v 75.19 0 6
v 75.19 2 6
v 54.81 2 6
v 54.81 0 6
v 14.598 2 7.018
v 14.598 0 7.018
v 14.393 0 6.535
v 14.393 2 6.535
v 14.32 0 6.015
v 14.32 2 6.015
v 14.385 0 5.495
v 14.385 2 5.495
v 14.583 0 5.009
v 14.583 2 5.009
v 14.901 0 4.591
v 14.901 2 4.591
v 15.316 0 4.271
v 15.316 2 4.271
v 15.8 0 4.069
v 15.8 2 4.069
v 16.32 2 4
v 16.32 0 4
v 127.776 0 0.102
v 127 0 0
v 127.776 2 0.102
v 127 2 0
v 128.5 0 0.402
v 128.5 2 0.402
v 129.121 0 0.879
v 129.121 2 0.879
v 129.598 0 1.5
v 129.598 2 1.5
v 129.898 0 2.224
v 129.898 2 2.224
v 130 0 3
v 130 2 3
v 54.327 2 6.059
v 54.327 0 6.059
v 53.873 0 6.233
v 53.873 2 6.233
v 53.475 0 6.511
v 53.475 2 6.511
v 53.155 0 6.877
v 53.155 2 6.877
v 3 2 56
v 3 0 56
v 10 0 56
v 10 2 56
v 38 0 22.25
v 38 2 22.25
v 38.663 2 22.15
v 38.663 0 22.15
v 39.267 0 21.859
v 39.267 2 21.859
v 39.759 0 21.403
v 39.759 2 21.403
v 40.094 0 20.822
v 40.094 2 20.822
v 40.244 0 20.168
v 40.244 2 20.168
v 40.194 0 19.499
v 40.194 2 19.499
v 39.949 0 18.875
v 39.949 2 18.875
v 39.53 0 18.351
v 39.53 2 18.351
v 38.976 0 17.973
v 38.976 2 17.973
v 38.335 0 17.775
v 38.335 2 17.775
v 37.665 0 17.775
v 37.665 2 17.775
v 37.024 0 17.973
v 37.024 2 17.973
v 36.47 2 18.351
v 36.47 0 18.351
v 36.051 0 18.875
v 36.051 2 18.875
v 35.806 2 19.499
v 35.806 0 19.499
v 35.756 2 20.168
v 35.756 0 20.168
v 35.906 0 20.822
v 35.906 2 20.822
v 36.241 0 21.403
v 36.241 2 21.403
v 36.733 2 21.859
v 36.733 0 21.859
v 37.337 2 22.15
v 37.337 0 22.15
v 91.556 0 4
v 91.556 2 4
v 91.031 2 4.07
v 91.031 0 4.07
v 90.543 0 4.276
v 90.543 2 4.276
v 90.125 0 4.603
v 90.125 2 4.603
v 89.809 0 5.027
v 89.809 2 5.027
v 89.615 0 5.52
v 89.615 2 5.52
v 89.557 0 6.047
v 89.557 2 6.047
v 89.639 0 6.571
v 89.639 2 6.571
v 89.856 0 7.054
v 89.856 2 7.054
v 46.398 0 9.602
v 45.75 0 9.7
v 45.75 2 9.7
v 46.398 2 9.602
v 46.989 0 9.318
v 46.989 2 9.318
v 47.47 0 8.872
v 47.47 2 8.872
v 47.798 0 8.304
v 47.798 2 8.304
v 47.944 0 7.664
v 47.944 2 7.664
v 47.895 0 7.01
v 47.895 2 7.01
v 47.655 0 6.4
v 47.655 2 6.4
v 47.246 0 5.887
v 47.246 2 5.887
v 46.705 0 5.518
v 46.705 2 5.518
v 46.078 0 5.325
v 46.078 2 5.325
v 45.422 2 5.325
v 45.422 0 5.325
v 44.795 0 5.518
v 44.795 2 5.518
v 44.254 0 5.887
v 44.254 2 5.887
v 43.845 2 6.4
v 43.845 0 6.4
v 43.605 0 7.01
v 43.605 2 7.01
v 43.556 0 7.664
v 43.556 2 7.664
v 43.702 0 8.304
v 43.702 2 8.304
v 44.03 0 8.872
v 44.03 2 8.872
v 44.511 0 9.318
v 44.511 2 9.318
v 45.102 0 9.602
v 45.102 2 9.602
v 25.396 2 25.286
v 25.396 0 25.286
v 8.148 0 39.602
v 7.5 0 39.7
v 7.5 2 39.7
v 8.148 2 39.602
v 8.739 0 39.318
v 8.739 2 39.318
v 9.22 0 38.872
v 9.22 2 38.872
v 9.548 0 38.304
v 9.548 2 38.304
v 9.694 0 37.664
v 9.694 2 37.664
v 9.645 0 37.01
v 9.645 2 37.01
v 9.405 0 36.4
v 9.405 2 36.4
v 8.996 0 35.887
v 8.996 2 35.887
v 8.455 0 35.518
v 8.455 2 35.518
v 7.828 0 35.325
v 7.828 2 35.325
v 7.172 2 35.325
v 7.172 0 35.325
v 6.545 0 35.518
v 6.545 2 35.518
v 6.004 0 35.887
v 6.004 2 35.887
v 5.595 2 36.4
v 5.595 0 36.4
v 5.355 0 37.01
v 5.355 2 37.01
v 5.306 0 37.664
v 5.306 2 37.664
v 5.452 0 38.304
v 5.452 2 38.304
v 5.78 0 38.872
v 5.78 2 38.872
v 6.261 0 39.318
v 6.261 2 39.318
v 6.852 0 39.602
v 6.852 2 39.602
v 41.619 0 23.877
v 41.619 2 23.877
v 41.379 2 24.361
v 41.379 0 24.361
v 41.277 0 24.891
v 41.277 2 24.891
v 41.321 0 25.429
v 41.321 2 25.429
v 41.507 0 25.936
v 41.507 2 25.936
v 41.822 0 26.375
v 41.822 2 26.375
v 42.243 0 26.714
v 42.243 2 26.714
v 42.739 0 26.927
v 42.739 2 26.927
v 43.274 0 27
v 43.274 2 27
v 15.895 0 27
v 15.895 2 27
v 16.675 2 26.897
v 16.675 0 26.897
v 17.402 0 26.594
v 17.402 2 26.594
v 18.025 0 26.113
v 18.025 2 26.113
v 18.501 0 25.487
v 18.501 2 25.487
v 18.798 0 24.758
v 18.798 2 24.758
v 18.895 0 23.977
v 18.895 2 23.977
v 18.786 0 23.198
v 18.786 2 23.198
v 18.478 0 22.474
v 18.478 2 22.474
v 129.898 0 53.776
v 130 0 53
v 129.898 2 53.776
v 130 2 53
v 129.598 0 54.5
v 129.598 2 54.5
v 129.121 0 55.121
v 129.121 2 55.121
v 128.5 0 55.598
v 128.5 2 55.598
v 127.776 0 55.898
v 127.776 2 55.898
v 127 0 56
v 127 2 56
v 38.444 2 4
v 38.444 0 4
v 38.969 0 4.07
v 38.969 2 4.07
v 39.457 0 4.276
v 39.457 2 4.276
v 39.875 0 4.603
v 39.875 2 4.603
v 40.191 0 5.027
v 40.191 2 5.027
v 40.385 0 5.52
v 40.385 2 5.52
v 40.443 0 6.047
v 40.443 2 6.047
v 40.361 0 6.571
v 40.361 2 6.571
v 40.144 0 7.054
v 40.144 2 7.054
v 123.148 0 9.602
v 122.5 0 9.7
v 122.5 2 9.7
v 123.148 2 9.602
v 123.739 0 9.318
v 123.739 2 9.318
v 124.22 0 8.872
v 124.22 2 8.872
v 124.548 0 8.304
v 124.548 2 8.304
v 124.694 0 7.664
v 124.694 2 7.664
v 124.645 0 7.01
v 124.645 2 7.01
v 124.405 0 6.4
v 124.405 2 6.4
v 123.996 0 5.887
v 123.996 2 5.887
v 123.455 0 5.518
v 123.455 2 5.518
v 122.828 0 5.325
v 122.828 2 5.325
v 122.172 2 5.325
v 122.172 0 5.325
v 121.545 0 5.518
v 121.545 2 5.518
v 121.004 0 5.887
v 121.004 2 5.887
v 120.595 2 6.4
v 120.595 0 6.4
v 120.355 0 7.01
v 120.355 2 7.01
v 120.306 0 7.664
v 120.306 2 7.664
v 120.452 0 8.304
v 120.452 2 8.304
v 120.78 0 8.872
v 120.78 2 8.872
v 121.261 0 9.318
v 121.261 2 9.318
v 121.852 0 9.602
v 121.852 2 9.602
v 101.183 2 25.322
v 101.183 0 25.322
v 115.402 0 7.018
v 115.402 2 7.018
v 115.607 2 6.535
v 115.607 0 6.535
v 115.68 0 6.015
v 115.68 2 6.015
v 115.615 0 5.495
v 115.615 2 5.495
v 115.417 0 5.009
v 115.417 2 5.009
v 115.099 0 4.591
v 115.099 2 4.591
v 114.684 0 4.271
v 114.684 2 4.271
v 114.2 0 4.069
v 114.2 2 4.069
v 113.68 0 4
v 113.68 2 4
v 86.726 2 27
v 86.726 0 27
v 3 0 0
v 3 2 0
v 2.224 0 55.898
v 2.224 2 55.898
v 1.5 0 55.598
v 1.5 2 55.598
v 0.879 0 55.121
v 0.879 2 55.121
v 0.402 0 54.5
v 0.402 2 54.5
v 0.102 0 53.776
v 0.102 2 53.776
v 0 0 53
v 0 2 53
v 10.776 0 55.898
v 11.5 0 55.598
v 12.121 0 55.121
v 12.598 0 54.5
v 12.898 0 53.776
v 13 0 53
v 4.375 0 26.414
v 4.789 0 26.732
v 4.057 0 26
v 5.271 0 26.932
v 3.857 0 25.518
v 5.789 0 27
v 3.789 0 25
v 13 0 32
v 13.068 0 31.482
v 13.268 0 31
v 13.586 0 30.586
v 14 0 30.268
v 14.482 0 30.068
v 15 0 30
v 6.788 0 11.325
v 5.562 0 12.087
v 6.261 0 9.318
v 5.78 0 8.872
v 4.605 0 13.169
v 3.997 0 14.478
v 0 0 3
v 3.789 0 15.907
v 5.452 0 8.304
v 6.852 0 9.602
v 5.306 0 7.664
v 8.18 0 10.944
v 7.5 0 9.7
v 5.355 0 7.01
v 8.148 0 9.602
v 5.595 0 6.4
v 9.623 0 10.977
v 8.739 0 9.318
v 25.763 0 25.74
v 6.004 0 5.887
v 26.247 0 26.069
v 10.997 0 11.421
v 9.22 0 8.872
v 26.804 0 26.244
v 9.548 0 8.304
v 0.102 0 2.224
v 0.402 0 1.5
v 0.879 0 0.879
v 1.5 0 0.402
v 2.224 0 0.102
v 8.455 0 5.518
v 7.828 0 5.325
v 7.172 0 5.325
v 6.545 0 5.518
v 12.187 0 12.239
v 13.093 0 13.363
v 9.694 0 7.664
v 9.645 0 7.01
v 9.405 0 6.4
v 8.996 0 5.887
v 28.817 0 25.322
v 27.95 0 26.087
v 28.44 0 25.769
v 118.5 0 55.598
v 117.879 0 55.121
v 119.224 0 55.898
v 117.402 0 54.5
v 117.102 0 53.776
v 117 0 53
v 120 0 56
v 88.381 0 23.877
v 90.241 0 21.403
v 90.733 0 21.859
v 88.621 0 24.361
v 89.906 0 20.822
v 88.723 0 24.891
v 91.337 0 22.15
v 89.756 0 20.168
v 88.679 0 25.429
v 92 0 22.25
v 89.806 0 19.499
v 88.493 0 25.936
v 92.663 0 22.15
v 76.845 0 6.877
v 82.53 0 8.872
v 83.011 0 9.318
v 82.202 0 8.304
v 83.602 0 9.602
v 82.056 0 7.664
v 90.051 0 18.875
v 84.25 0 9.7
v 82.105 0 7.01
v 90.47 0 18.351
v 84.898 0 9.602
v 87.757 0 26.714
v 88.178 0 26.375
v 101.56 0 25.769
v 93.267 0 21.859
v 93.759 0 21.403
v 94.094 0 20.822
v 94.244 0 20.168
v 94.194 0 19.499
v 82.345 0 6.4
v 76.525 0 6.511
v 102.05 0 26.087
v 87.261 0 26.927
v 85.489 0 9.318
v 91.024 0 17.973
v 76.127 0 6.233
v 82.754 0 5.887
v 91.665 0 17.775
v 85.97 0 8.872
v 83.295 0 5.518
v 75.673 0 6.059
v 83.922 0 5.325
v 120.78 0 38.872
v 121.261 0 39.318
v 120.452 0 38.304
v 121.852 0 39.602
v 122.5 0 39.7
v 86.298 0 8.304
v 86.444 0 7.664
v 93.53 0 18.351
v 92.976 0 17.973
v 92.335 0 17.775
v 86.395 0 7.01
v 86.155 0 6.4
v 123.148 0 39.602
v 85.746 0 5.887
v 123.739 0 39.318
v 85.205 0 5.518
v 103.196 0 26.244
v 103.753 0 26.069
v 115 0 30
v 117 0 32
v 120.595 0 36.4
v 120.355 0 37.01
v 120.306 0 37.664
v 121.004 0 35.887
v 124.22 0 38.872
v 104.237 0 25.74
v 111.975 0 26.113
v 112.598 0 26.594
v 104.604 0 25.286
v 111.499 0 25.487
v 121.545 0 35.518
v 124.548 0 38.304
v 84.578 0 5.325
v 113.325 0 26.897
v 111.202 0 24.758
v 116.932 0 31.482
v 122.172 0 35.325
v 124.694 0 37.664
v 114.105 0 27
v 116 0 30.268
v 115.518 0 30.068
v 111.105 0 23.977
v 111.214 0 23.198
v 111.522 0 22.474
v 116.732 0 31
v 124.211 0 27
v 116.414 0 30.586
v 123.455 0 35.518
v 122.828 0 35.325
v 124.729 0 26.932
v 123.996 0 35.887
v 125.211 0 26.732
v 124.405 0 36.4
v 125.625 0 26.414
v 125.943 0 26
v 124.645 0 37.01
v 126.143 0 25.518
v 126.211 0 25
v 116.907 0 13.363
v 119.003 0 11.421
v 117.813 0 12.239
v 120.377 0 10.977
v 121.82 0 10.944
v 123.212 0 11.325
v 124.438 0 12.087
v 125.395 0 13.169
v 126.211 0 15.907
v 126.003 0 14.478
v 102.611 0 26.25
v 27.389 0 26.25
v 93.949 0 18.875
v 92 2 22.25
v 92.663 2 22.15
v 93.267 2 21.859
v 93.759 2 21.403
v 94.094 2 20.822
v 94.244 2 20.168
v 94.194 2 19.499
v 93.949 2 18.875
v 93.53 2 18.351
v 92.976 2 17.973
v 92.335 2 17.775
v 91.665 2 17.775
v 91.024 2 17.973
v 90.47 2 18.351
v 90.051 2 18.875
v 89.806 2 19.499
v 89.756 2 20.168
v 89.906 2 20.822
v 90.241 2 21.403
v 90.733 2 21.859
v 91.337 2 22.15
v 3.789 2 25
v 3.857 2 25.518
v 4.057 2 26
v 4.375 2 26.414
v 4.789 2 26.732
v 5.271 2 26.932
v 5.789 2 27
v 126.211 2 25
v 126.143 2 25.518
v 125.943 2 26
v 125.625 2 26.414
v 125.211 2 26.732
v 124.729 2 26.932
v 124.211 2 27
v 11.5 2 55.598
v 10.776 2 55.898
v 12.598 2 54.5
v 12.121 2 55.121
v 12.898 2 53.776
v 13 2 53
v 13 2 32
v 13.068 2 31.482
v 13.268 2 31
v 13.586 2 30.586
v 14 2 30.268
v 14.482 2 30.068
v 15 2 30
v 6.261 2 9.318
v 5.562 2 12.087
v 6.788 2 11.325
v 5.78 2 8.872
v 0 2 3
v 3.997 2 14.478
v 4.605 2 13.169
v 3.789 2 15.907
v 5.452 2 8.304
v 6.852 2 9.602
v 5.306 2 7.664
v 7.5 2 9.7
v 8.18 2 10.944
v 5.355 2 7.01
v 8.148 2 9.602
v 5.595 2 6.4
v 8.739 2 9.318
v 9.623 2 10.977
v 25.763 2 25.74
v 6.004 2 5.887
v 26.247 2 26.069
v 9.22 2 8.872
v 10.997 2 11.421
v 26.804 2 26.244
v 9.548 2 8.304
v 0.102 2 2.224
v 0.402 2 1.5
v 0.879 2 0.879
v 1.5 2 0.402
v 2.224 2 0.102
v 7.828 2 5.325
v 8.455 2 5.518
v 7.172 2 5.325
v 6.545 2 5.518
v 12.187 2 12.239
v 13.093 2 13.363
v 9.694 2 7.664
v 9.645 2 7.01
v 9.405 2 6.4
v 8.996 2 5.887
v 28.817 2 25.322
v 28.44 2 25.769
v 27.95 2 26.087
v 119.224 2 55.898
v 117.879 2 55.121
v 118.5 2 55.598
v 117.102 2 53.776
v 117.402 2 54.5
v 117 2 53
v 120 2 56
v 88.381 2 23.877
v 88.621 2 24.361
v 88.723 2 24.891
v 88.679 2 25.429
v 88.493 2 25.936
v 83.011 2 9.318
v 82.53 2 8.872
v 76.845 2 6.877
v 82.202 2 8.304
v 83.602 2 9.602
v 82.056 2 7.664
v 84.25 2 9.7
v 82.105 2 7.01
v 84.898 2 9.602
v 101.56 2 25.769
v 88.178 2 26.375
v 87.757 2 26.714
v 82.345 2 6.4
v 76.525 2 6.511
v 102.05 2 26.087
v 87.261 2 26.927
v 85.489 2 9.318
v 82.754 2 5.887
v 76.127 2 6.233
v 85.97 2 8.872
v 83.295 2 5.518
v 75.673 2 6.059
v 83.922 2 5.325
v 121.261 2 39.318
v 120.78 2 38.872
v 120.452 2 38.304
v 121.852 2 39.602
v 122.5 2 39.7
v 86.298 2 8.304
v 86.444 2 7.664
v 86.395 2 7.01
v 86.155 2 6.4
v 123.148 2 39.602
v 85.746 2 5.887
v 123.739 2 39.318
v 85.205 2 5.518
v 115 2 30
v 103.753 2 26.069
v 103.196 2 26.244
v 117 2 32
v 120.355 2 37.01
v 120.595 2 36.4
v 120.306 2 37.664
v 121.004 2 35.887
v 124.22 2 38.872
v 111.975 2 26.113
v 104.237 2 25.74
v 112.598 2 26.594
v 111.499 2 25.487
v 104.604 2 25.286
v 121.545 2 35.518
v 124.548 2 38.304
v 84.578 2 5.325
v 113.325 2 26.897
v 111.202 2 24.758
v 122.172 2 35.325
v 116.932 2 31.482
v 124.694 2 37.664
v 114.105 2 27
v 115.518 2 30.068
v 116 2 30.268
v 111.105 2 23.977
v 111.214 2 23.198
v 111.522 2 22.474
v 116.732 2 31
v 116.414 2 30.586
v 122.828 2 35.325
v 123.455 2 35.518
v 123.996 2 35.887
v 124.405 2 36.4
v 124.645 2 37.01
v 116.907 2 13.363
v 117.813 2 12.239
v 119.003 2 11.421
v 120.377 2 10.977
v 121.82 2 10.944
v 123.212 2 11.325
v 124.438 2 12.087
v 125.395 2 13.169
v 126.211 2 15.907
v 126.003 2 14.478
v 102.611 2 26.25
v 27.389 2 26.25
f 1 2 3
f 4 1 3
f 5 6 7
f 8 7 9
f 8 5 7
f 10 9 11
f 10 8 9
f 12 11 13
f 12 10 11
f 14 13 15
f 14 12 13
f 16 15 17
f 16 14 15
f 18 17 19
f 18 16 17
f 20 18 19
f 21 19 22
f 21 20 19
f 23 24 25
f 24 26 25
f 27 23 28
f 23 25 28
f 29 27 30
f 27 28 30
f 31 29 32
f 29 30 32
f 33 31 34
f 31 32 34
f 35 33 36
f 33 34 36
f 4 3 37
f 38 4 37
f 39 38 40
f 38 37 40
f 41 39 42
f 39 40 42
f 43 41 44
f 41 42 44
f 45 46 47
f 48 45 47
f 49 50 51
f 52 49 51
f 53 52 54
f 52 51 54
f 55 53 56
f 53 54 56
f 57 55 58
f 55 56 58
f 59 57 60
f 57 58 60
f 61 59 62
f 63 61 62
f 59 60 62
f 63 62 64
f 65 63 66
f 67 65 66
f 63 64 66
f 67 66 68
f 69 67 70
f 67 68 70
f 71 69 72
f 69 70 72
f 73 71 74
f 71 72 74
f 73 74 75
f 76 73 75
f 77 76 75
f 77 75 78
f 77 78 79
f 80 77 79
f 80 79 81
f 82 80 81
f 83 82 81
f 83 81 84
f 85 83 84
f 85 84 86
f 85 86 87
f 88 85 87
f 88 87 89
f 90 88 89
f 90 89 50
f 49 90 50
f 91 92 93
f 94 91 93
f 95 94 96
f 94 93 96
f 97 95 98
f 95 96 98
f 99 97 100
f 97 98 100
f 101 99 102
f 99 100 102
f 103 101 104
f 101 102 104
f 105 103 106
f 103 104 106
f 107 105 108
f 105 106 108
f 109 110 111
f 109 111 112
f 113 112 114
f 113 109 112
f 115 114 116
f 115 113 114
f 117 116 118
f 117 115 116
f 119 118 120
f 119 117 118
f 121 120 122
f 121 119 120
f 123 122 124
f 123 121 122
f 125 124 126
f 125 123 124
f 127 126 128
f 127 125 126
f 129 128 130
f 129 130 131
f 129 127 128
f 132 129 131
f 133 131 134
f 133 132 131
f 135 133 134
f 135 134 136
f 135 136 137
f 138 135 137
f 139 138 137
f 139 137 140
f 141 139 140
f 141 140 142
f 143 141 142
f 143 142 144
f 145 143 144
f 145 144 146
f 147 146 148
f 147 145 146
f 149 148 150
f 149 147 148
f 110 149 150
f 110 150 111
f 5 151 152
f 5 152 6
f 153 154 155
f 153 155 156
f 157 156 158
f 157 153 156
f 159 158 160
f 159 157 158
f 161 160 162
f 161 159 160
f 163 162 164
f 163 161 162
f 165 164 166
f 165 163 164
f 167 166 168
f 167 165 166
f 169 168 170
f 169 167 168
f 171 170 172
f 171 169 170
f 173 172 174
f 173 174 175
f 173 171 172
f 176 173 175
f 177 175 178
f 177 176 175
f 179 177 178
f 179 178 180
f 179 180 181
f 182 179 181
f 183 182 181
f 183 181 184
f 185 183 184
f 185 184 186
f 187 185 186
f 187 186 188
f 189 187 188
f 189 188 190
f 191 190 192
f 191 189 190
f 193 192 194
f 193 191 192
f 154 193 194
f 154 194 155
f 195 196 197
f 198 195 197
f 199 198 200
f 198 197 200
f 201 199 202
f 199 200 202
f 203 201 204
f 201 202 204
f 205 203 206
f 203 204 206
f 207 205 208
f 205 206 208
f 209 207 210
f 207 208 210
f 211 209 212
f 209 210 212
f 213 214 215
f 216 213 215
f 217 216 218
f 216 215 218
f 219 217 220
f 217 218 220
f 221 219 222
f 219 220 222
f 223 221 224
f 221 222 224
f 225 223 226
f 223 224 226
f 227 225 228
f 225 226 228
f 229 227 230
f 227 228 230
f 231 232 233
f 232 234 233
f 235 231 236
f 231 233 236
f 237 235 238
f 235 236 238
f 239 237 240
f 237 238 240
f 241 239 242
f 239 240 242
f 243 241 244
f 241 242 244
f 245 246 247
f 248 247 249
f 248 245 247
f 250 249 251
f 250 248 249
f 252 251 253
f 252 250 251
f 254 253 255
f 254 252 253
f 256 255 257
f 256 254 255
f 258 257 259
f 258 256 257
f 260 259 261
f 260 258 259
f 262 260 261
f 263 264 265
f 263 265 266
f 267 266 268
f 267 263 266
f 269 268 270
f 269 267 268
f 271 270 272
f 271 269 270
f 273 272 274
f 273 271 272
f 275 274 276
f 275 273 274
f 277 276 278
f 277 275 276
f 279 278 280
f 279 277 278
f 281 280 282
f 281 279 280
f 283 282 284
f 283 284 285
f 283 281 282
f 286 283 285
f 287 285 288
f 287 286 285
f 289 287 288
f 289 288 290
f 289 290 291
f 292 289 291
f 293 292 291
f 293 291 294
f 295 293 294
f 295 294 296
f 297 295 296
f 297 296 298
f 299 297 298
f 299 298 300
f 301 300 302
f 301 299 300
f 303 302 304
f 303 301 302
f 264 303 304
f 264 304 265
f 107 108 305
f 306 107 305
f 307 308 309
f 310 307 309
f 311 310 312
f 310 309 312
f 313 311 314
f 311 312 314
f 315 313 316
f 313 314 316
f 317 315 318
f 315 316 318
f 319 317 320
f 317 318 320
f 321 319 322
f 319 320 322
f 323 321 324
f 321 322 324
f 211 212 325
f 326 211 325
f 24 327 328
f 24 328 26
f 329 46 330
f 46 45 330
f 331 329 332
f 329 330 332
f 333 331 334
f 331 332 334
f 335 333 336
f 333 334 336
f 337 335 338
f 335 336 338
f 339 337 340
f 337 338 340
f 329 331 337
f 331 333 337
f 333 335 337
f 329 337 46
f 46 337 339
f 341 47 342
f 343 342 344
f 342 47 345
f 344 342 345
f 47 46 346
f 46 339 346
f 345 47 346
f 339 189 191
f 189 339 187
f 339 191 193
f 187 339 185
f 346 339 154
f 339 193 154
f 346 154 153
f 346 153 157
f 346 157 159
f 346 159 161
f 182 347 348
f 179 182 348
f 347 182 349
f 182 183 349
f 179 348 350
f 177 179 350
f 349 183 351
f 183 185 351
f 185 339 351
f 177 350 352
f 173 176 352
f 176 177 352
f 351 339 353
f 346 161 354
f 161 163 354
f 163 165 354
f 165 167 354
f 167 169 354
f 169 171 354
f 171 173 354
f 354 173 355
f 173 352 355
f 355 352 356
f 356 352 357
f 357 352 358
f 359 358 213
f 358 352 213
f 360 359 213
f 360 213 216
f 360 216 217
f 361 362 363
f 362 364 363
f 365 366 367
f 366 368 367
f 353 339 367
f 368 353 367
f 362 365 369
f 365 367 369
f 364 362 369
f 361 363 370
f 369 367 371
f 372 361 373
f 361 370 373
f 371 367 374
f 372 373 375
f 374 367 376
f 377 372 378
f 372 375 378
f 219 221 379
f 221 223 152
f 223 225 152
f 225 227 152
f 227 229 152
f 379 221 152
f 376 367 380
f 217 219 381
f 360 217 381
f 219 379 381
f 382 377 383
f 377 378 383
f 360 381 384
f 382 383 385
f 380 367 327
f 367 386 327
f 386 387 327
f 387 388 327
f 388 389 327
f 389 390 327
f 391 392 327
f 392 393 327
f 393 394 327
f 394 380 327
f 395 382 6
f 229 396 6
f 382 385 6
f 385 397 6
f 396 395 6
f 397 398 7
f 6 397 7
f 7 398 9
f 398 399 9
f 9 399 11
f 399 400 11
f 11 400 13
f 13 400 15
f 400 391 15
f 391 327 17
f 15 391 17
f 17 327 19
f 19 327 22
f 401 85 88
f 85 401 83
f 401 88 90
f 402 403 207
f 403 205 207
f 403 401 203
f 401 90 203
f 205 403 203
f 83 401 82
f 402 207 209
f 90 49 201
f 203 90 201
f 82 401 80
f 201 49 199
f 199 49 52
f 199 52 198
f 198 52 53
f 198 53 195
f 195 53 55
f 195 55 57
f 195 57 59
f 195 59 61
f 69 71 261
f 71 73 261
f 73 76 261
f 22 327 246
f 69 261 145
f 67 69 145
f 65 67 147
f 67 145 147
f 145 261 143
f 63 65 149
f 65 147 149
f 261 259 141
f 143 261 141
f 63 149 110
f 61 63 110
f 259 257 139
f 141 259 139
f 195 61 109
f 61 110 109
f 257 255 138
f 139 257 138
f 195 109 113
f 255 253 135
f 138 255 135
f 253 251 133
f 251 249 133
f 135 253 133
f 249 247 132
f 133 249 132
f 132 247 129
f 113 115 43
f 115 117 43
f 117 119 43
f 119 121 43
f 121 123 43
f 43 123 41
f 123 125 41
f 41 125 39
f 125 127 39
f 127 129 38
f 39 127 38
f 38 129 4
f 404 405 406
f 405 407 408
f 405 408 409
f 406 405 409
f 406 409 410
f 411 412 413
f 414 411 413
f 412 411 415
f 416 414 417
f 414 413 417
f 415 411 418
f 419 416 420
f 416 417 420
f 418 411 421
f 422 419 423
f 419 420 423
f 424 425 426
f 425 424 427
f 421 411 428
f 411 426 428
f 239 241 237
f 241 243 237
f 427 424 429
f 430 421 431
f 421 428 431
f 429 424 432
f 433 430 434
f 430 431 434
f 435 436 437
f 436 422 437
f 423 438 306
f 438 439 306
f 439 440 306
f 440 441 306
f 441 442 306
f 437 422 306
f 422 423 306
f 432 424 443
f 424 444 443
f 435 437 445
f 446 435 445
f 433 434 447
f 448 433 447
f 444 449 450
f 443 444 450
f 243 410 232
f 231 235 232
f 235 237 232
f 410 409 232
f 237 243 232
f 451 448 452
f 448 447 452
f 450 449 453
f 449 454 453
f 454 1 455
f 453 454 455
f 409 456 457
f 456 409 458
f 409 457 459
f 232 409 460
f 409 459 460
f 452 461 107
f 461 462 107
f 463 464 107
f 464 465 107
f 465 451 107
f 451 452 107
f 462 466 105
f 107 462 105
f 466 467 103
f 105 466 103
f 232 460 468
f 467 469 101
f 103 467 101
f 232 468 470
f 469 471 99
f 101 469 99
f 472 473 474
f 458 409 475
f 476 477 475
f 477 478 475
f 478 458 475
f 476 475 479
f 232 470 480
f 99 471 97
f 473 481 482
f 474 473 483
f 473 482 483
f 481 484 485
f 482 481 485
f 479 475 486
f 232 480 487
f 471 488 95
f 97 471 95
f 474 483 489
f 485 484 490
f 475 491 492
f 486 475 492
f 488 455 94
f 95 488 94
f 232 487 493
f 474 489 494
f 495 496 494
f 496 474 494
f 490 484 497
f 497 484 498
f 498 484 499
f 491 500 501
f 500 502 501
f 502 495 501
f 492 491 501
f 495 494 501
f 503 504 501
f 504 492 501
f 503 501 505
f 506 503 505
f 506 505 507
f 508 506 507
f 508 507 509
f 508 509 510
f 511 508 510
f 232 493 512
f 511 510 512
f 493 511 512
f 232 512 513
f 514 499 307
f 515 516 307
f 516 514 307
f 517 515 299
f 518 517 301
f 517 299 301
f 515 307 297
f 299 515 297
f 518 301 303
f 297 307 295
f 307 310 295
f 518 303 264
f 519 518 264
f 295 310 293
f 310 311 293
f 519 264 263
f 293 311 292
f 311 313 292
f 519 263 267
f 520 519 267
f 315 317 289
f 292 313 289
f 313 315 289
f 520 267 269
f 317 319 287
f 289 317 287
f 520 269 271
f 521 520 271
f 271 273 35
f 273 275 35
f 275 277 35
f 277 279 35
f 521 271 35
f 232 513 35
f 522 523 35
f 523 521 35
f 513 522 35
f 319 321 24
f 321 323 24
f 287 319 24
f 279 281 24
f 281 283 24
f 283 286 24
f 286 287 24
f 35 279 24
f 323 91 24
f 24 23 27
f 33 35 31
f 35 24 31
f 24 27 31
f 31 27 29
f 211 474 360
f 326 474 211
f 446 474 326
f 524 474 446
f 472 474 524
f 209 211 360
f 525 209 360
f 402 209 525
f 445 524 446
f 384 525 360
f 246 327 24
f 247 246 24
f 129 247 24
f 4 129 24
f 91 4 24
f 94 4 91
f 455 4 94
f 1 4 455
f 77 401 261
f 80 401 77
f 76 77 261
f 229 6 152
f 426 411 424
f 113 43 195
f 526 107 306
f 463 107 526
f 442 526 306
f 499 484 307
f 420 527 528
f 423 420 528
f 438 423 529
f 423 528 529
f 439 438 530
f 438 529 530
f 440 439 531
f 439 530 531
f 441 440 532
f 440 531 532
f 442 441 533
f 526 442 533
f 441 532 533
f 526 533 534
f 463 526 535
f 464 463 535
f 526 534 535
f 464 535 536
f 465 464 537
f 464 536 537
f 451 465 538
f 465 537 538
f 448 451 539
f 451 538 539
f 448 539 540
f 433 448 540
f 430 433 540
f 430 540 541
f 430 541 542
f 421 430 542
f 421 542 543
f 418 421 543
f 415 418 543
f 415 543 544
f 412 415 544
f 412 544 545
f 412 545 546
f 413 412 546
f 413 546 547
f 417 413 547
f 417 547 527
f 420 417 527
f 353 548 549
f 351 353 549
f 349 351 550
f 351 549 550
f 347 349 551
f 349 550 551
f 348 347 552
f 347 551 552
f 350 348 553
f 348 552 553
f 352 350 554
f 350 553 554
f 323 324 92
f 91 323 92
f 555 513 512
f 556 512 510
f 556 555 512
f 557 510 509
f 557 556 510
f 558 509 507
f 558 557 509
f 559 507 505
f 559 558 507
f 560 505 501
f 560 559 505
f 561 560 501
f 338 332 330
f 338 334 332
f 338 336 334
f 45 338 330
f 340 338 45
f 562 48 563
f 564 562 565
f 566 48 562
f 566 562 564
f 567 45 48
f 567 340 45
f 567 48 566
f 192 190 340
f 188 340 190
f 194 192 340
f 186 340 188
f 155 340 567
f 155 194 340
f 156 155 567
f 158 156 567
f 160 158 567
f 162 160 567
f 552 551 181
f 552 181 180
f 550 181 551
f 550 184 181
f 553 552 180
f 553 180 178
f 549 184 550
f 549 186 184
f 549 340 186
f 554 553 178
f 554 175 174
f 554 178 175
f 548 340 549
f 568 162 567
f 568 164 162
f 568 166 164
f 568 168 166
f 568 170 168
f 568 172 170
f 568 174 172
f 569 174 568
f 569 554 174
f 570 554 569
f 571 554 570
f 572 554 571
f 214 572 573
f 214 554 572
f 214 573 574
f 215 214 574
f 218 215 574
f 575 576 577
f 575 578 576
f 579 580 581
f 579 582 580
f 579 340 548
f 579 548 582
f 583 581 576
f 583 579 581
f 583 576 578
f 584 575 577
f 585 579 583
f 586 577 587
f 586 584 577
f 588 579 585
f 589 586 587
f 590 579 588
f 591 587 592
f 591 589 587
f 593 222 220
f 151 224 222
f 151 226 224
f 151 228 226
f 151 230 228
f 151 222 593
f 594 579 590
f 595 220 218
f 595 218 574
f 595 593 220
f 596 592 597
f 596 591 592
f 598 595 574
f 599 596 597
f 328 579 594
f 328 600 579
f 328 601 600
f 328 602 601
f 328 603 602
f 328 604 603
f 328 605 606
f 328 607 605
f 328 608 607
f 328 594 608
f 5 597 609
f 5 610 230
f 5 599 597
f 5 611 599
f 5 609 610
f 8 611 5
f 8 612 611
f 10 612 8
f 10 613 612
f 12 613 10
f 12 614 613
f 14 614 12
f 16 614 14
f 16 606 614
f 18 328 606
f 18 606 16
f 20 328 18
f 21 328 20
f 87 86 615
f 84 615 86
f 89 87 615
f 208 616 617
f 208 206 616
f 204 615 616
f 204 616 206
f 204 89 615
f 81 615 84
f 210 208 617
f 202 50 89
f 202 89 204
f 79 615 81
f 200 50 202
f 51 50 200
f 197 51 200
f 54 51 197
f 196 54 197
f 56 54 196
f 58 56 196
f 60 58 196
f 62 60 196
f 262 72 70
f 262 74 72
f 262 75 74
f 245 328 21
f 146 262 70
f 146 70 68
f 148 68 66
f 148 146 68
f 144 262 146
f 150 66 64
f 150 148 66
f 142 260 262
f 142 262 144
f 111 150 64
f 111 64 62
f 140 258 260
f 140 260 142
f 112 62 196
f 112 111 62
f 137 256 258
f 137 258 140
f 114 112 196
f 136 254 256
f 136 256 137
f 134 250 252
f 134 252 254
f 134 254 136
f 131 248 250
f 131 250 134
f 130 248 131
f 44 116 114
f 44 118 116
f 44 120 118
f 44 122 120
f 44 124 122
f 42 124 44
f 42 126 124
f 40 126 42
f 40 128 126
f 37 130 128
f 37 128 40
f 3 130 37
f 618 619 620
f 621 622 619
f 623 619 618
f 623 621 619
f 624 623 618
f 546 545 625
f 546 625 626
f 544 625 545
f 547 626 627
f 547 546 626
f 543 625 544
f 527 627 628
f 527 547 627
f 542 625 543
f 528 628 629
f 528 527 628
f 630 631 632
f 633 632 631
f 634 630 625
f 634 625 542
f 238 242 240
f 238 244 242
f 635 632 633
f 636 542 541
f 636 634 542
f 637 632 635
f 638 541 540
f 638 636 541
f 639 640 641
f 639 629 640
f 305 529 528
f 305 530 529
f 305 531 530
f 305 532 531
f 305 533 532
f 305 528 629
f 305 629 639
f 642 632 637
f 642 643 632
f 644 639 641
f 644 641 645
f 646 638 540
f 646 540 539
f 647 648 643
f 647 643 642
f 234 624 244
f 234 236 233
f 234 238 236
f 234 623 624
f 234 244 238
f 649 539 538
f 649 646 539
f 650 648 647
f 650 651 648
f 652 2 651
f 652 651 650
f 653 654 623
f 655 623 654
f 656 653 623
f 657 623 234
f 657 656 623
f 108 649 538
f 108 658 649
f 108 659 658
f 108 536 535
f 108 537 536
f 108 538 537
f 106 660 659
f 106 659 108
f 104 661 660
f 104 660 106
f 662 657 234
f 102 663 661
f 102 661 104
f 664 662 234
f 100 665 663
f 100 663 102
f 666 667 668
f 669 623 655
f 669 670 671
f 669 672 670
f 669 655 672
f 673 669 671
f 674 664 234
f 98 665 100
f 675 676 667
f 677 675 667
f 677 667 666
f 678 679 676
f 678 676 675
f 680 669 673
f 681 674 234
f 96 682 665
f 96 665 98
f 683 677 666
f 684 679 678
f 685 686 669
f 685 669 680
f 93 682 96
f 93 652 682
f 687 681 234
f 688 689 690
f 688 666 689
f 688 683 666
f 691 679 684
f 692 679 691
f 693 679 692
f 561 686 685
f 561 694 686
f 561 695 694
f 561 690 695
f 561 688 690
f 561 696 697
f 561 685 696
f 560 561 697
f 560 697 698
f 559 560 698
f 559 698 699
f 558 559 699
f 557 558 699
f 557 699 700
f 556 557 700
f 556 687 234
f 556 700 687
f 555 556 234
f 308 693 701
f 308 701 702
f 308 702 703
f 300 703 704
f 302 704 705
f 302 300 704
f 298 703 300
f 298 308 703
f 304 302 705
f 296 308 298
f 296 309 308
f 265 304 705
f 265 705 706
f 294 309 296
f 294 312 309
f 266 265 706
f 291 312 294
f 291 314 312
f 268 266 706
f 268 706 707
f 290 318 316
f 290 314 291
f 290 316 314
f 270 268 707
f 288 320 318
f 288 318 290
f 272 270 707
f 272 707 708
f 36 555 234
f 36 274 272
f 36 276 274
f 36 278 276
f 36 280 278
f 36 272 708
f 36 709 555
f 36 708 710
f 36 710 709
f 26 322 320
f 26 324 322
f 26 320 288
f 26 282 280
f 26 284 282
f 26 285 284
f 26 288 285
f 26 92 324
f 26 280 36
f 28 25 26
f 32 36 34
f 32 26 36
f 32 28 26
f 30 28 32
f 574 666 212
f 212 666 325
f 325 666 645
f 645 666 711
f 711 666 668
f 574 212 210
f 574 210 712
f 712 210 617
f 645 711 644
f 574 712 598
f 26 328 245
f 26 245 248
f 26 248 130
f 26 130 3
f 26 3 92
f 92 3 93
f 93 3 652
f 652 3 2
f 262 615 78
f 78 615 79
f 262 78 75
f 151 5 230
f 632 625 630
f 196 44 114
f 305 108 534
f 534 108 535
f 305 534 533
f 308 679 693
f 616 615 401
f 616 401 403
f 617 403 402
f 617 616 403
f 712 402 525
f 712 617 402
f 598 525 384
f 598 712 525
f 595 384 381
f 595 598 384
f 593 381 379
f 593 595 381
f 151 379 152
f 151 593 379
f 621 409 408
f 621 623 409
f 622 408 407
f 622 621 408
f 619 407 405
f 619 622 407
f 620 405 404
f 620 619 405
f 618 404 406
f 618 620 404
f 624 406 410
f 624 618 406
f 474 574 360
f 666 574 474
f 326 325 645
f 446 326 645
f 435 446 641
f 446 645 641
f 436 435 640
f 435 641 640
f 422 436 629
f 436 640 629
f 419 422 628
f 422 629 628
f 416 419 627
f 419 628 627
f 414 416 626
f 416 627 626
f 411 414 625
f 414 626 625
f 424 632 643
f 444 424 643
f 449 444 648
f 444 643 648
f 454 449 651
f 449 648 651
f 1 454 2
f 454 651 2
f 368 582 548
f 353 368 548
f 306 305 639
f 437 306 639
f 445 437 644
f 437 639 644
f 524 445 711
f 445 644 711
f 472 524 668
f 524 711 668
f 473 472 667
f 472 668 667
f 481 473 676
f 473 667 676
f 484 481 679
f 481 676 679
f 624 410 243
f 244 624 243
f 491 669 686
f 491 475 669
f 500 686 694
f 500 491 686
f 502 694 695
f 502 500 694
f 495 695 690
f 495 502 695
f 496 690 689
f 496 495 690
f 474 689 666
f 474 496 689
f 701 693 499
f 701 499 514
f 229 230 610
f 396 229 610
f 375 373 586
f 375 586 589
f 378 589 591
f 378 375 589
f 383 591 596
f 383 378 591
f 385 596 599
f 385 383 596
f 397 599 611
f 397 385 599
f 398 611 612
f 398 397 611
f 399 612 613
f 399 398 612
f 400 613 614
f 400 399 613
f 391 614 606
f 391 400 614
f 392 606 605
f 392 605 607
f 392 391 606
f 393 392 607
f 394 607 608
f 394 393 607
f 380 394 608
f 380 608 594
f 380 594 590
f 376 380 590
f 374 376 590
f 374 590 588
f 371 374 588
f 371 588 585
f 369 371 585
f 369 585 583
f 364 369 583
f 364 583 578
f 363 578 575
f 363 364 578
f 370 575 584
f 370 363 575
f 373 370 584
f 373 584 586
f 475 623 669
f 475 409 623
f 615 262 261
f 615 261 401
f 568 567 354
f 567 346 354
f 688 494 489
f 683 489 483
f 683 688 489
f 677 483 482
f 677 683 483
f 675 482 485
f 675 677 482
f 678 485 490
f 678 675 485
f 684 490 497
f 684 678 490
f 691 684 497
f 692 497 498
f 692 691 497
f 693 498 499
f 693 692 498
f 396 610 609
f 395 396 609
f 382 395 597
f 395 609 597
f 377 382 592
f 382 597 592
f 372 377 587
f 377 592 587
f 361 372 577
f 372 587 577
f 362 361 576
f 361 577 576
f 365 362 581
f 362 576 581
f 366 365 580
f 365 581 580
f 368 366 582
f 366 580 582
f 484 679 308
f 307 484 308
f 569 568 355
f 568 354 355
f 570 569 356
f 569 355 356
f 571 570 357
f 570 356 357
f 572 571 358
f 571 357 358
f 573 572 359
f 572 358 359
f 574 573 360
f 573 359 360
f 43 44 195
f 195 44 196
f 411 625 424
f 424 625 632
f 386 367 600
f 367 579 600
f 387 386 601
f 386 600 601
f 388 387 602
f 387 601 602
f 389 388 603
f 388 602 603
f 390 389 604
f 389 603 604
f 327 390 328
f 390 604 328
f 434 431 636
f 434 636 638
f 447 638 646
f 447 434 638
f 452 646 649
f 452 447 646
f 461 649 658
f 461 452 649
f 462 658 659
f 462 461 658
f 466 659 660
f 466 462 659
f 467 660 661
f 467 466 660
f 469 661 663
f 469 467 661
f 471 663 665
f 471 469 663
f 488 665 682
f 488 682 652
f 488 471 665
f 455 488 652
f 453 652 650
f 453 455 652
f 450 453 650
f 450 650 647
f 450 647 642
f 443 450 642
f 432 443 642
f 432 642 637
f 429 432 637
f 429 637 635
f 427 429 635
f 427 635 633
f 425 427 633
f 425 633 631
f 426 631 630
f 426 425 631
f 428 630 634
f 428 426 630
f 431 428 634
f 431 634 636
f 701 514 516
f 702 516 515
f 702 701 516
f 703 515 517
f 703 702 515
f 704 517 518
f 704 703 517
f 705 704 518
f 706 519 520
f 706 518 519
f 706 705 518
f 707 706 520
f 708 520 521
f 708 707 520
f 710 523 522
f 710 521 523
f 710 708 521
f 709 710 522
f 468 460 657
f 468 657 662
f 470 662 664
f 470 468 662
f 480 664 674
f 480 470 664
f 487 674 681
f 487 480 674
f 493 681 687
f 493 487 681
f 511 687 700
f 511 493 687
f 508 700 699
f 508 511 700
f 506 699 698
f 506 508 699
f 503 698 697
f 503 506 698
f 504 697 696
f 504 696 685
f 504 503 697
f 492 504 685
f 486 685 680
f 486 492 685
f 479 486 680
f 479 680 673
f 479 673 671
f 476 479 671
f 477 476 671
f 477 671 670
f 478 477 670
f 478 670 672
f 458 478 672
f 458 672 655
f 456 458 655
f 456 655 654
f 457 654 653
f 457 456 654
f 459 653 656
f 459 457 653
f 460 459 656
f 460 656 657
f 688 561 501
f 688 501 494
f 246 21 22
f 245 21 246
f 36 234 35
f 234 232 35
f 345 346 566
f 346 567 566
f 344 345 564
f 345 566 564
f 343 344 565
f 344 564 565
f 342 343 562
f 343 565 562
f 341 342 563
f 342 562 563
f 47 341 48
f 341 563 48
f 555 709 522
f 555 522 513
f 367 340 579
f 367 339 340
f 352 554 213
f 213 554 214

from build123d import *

# Parameters (mm, degrees)
SKETCH_1_W          = 13
SKETCH_1_H          = 22
SKETCH_1_R          = 2.2
SKETCH_1_H_2        = 19
SKETCH_1_H_3        = 15
SKETCH_1_W_2        = 104
EXTRUDE_3_DEPTH     = 2
SKETCH_2_R          = 2.25
CUT_EXTRUDE_1_DEPTH = 10
CUT_EXTRUDE_2_DEPTH = 10
SKETCH_4_W          = 104
SKETCH_4_H          = 4
CUT_EXTRUDE_3_DEPTH = 10
FILLET_1_R          = 2
FILLET_2_R          = 3


with BuildPart() as part:
    # 草图1 → 凸台-拉伸3 (new body)
    # profile 1 of 8: a face of its own
    with BuildSketch(Plane(origin=(0, 0, 0), x_dir=(1, 0, 0), z_dir=(0, 1, 0))):
        with Locations((6.5, -45)):
            Rectangle(SKETCH_1_W, SKETCH_1_H)
        with Locations(Location((7.5, -37.5, 0), (0, 0, 270))):
            Circle(SKETCH_1_R, mode=Mode.SUBTRACT)
    # profile 2 of 8: a face of its own
    with BuildSketch(Plane(origin=(0, 0, 0), x_dir=(1, 0, 0), z_dir=(0, 1, 0))):
        with Locations((6.5, -24.5)):
            Rectangle(SKETCH_1_W, SKETCH_1_H_2)
    # profile 3 of 8: a face of its own
    with BuildSketch(Plane(origin=(0, 0, 0), x_dir=(1, 0, 0), z_dir=(0, 1, 0))):
        with Locations((6.5, -7.5)):
            Rectangle(SKETCH_1_W, SKETCH_1_H_3)
        with Locations(Location((7.5, -7.5, 0), (0, 0, 270))):
            Circle(SKETCH_1_R, mode=Mode.SUBTRACT)
    # profile 4 of 8: a face of its own
    with BuildSketch(Plane(origin=(0, 0, 0), x_dir=(1, 0, 0), z_dir=(0, 1, 0))):
        with Locations((65, -7.5)):
            Rectangle(SKETCH_1_W_2, SKETCH_1_H_3)
        with Locations(Location((45.75, -7.5, 0), (0, 0, 270))):
            Circle(SKETCH_1_R, mode=Mode.SUBTRACT)
        with Locations(Location((84.25, -7.5, 0), (0, 0, 270))):
            Circle(SKETCH_1_R, mode=Mode.SUBTRACT)
    # profile 5 of 8: a face of its own
    with BuildSketch(Plane(origin=(0, 0, 0), x_dir=(1, 0, 0), z_dir=(0, 1, 0))):
        with Locations((123.5, -7.5)):
            Rectangle(SKETCH_1_W, SKETCH_1_H_3)
        with Locations(Location((122.5, -7.5, 0), (0, 0, 270))):
            Circle(SKETCH_1_R, mode=Mode.SUBTRACT)
    # profile 6 of 8: a face of its own
    with BuildSketch(Plane(origin=(0, 0, 0), x_dir=(1, 0, 0), z_dir=(0, 1, 0))):
        with Locations((123.5, -24.5)):
            Rectangle(SKETCH_1_W, SKETCH_1_H_2)
    # profile 7 of 8: a face of its own
    with BuildSketch(Plane(origin=(0, 0, 0), x_dir=(1, 0, 0), z_dir=(0, 1, 0))):
        with Locations((123.5, -45)):
            Rectangle(SKETCH_1_W, SKETCH_1_H)
        with Locations(Location((122.5, -37.5, 0), (0, 0, 270))):
            Circle(SKETCH_1_R, mode=Mode.SUBTRACT)
    # profile 8 of 8: a face of its own
    with BuildSketch(Plane(origin=(0, 0, 0), x_dir=(1, 0, 0), z_dir=(0, 1, 0))):
        with Locations((65, -24.5)):
            Rectangle(SKETCH_1_W_2, SKETCH_1_H_2)
    extrude(amount=EXTRUDE_3_DEPTH)

    # 草图2 → 切除-拉伸1 (cut)
    with BuildSketch(Plane(origin=(0, 2, 0), x_dir=(1, 0, 0), z_dir=(0, 1, 0))):
        with Locations(Location((38, -20, 0), (0, 0, 270))):
            Circle(SKETCH_2_R)
        with Locations(Location((92, -20, 0), (0, 0, 270))):
            Circle(SKETCH_2_R)
    extrude(amount=-CUT_EXTRUDE_1_DEPTH, mode=Mode.SUBTRACT)

    # 草图3 → 切除-拉伸2 (cut)
    with BuildSketch(Plane(origin=(0, 2, 0), x_dir=(1, 0, 0), z_dir=(0, 1, 0))):
        with BuildLine():
            ThreePointArc((38.443762995, -4), (40.191298213, -5.02731266), (40.143568379, -7.053879338))
            Line((40.143568379, -7.053879338), (28.817131634, -25.3223257))
            ThreePointArc((28.817131634, -25.3223257), (27.096125533, -26.268333991), (25.39556113, -25.286053787))
            Line((25.39556113, -25.286053787), (14.598439949, -7.017607424))
            ThreePointArc((14.598439949, -7.017607424), (14.583078872, -5.00884281), (16.320205069, -4))
            Line((16.320205069, -4), (38.443762995, -4))
        make_face()
        with BuildLine():
            Line((3.788738097, -15.906719656), (3.788738097, -25))
            ThreePointArc((3.788738097, -25), (4.374524535, -26.414213562), (5.788738097, -27))
            Line((5.788738097, -27), (15.89527198, -27))
            ThreePointArc((15.89527198, -27), (18.500961276, -25.486735785), (18.477919661, -22.473588863))
            Line((18.477919661, -22.473588863), (13.093150898, -13.362701095))
            ThreePointArc((13.093150898, -13.362701095), (7.470038739, -11.083750445), (3.788738097, -15.906719656))
        make_face()
        with BuildLine():
            Line((65, -27), (65, -6))
            Line((65, -6), (54.809846331, -6))
            ThreePointArc((54.809846331, -6), (53.873365064, -6.23279802), (53.154894782, -6.876997163))
            Line((53.154894782, -6.876997163), (41.619180496, -23.876997163))
            ThreePointArc((41.619180496, -23.876997163), (41.506930066, -25.936481267), (43.274132045, -27))
            Line((43.274132045, -27), (65, -27))
        make_face()
        with BuildLine():
            Line((75.190153669, -6), (65, -6))
            Line((65, -6), (65, -27))
            Line((65, -27), (86.725867955, -27))
            ThreePointArc((86.725867955, -27), (88.493069934, -25.936481267), (88.380819504, -23.876997163))
            Line((88.380819504, -23.876997163), (76.845105218, -6.876997163))
            ThreePointArc((76.845105218, -6.876997163), (76.126634936, -6.23279802), (75.190153669, -6))
        make_face()
        with BuildLine():
            Line((89.856431621, -7.053879338), (101.182868366, -25.3223257))
            ThreePointArc((101.182868366, -25.3223257), (102.903874467, -26.268333991), (104.60443887, -25.286053787))
            Line((104.60443887, -25.286053787), (115.401560051, -7.017607424))
            ThreePointArc((115.401560051, -7.017607424), (115.416921128, -5.00884281), (113.679794931, -4))
            Line((113.679794931, -4), (91.556237005, -4))
            ThreePointArc((91.556237005, -4), (89.808701787, -5.02731266), (89.856431621, -7.053879338))
        make_face()
        with BuildLine():
            ThreePointArc((126.211261903, -25), (125.625475465, -26.414213562), (124.211261903, -27))
            Line((124.211261903, -27), (114.10472802, -27))
            ThreePointArc((114.10472802, -27), (111.499038724, -25.486735785), (111.522080339, -22.473588863))
            Line((111.522080339, -22.473588863), (116.906849102, -13.362701095))
            ThreePointArc((116.906849102, -13.362701095), (122.529961261, -11.083750445), (126.211261903, -15.906719656))
            Line((126.211261903, -15.906719656), (126.211261903, -25))
        make_face()
    extrude(amount=-CUT_EXTRUDE_2_DEPTH, mode=Mode.SUBTRACT)

    # 草图4 → 切除-拉伸3 (cut)
    with BuildSketch(Plane(origin=(0, 2, 0), x_dir=(1, 0, 0), z_dir=(0, 1, 0))):
        with Locations((65, -32)):
            Rectangle(SKETCH_4_W, SKETCH_4_H)
    extrude(amount=-CUT_EXTRUDE_3_DEPTH, mode=Mode.SUBTRACT)

    # 圆角1
    fillet_1_edges = [part.edges().sort_by_distance(p)[0] for p in [
        (13, 1, 30),
        (117, 1, 30),
    ]]
    fillet(fillet_1_edges, radius=FILLET_1_R)

    # 圆角2
    fillet_2_edges = [part.edges().sort_by_distance(p)[0] for p in [
        (130, 1, 56),
        (117, 1, 56),
        (13, 1, 56),
        (0, 1, 56),
        (0, 1, 0),
        (130, 1, 0),
    ]]
    fillet(fillet_2_edges, radius=FILLET_2_R)


solid = part.part
